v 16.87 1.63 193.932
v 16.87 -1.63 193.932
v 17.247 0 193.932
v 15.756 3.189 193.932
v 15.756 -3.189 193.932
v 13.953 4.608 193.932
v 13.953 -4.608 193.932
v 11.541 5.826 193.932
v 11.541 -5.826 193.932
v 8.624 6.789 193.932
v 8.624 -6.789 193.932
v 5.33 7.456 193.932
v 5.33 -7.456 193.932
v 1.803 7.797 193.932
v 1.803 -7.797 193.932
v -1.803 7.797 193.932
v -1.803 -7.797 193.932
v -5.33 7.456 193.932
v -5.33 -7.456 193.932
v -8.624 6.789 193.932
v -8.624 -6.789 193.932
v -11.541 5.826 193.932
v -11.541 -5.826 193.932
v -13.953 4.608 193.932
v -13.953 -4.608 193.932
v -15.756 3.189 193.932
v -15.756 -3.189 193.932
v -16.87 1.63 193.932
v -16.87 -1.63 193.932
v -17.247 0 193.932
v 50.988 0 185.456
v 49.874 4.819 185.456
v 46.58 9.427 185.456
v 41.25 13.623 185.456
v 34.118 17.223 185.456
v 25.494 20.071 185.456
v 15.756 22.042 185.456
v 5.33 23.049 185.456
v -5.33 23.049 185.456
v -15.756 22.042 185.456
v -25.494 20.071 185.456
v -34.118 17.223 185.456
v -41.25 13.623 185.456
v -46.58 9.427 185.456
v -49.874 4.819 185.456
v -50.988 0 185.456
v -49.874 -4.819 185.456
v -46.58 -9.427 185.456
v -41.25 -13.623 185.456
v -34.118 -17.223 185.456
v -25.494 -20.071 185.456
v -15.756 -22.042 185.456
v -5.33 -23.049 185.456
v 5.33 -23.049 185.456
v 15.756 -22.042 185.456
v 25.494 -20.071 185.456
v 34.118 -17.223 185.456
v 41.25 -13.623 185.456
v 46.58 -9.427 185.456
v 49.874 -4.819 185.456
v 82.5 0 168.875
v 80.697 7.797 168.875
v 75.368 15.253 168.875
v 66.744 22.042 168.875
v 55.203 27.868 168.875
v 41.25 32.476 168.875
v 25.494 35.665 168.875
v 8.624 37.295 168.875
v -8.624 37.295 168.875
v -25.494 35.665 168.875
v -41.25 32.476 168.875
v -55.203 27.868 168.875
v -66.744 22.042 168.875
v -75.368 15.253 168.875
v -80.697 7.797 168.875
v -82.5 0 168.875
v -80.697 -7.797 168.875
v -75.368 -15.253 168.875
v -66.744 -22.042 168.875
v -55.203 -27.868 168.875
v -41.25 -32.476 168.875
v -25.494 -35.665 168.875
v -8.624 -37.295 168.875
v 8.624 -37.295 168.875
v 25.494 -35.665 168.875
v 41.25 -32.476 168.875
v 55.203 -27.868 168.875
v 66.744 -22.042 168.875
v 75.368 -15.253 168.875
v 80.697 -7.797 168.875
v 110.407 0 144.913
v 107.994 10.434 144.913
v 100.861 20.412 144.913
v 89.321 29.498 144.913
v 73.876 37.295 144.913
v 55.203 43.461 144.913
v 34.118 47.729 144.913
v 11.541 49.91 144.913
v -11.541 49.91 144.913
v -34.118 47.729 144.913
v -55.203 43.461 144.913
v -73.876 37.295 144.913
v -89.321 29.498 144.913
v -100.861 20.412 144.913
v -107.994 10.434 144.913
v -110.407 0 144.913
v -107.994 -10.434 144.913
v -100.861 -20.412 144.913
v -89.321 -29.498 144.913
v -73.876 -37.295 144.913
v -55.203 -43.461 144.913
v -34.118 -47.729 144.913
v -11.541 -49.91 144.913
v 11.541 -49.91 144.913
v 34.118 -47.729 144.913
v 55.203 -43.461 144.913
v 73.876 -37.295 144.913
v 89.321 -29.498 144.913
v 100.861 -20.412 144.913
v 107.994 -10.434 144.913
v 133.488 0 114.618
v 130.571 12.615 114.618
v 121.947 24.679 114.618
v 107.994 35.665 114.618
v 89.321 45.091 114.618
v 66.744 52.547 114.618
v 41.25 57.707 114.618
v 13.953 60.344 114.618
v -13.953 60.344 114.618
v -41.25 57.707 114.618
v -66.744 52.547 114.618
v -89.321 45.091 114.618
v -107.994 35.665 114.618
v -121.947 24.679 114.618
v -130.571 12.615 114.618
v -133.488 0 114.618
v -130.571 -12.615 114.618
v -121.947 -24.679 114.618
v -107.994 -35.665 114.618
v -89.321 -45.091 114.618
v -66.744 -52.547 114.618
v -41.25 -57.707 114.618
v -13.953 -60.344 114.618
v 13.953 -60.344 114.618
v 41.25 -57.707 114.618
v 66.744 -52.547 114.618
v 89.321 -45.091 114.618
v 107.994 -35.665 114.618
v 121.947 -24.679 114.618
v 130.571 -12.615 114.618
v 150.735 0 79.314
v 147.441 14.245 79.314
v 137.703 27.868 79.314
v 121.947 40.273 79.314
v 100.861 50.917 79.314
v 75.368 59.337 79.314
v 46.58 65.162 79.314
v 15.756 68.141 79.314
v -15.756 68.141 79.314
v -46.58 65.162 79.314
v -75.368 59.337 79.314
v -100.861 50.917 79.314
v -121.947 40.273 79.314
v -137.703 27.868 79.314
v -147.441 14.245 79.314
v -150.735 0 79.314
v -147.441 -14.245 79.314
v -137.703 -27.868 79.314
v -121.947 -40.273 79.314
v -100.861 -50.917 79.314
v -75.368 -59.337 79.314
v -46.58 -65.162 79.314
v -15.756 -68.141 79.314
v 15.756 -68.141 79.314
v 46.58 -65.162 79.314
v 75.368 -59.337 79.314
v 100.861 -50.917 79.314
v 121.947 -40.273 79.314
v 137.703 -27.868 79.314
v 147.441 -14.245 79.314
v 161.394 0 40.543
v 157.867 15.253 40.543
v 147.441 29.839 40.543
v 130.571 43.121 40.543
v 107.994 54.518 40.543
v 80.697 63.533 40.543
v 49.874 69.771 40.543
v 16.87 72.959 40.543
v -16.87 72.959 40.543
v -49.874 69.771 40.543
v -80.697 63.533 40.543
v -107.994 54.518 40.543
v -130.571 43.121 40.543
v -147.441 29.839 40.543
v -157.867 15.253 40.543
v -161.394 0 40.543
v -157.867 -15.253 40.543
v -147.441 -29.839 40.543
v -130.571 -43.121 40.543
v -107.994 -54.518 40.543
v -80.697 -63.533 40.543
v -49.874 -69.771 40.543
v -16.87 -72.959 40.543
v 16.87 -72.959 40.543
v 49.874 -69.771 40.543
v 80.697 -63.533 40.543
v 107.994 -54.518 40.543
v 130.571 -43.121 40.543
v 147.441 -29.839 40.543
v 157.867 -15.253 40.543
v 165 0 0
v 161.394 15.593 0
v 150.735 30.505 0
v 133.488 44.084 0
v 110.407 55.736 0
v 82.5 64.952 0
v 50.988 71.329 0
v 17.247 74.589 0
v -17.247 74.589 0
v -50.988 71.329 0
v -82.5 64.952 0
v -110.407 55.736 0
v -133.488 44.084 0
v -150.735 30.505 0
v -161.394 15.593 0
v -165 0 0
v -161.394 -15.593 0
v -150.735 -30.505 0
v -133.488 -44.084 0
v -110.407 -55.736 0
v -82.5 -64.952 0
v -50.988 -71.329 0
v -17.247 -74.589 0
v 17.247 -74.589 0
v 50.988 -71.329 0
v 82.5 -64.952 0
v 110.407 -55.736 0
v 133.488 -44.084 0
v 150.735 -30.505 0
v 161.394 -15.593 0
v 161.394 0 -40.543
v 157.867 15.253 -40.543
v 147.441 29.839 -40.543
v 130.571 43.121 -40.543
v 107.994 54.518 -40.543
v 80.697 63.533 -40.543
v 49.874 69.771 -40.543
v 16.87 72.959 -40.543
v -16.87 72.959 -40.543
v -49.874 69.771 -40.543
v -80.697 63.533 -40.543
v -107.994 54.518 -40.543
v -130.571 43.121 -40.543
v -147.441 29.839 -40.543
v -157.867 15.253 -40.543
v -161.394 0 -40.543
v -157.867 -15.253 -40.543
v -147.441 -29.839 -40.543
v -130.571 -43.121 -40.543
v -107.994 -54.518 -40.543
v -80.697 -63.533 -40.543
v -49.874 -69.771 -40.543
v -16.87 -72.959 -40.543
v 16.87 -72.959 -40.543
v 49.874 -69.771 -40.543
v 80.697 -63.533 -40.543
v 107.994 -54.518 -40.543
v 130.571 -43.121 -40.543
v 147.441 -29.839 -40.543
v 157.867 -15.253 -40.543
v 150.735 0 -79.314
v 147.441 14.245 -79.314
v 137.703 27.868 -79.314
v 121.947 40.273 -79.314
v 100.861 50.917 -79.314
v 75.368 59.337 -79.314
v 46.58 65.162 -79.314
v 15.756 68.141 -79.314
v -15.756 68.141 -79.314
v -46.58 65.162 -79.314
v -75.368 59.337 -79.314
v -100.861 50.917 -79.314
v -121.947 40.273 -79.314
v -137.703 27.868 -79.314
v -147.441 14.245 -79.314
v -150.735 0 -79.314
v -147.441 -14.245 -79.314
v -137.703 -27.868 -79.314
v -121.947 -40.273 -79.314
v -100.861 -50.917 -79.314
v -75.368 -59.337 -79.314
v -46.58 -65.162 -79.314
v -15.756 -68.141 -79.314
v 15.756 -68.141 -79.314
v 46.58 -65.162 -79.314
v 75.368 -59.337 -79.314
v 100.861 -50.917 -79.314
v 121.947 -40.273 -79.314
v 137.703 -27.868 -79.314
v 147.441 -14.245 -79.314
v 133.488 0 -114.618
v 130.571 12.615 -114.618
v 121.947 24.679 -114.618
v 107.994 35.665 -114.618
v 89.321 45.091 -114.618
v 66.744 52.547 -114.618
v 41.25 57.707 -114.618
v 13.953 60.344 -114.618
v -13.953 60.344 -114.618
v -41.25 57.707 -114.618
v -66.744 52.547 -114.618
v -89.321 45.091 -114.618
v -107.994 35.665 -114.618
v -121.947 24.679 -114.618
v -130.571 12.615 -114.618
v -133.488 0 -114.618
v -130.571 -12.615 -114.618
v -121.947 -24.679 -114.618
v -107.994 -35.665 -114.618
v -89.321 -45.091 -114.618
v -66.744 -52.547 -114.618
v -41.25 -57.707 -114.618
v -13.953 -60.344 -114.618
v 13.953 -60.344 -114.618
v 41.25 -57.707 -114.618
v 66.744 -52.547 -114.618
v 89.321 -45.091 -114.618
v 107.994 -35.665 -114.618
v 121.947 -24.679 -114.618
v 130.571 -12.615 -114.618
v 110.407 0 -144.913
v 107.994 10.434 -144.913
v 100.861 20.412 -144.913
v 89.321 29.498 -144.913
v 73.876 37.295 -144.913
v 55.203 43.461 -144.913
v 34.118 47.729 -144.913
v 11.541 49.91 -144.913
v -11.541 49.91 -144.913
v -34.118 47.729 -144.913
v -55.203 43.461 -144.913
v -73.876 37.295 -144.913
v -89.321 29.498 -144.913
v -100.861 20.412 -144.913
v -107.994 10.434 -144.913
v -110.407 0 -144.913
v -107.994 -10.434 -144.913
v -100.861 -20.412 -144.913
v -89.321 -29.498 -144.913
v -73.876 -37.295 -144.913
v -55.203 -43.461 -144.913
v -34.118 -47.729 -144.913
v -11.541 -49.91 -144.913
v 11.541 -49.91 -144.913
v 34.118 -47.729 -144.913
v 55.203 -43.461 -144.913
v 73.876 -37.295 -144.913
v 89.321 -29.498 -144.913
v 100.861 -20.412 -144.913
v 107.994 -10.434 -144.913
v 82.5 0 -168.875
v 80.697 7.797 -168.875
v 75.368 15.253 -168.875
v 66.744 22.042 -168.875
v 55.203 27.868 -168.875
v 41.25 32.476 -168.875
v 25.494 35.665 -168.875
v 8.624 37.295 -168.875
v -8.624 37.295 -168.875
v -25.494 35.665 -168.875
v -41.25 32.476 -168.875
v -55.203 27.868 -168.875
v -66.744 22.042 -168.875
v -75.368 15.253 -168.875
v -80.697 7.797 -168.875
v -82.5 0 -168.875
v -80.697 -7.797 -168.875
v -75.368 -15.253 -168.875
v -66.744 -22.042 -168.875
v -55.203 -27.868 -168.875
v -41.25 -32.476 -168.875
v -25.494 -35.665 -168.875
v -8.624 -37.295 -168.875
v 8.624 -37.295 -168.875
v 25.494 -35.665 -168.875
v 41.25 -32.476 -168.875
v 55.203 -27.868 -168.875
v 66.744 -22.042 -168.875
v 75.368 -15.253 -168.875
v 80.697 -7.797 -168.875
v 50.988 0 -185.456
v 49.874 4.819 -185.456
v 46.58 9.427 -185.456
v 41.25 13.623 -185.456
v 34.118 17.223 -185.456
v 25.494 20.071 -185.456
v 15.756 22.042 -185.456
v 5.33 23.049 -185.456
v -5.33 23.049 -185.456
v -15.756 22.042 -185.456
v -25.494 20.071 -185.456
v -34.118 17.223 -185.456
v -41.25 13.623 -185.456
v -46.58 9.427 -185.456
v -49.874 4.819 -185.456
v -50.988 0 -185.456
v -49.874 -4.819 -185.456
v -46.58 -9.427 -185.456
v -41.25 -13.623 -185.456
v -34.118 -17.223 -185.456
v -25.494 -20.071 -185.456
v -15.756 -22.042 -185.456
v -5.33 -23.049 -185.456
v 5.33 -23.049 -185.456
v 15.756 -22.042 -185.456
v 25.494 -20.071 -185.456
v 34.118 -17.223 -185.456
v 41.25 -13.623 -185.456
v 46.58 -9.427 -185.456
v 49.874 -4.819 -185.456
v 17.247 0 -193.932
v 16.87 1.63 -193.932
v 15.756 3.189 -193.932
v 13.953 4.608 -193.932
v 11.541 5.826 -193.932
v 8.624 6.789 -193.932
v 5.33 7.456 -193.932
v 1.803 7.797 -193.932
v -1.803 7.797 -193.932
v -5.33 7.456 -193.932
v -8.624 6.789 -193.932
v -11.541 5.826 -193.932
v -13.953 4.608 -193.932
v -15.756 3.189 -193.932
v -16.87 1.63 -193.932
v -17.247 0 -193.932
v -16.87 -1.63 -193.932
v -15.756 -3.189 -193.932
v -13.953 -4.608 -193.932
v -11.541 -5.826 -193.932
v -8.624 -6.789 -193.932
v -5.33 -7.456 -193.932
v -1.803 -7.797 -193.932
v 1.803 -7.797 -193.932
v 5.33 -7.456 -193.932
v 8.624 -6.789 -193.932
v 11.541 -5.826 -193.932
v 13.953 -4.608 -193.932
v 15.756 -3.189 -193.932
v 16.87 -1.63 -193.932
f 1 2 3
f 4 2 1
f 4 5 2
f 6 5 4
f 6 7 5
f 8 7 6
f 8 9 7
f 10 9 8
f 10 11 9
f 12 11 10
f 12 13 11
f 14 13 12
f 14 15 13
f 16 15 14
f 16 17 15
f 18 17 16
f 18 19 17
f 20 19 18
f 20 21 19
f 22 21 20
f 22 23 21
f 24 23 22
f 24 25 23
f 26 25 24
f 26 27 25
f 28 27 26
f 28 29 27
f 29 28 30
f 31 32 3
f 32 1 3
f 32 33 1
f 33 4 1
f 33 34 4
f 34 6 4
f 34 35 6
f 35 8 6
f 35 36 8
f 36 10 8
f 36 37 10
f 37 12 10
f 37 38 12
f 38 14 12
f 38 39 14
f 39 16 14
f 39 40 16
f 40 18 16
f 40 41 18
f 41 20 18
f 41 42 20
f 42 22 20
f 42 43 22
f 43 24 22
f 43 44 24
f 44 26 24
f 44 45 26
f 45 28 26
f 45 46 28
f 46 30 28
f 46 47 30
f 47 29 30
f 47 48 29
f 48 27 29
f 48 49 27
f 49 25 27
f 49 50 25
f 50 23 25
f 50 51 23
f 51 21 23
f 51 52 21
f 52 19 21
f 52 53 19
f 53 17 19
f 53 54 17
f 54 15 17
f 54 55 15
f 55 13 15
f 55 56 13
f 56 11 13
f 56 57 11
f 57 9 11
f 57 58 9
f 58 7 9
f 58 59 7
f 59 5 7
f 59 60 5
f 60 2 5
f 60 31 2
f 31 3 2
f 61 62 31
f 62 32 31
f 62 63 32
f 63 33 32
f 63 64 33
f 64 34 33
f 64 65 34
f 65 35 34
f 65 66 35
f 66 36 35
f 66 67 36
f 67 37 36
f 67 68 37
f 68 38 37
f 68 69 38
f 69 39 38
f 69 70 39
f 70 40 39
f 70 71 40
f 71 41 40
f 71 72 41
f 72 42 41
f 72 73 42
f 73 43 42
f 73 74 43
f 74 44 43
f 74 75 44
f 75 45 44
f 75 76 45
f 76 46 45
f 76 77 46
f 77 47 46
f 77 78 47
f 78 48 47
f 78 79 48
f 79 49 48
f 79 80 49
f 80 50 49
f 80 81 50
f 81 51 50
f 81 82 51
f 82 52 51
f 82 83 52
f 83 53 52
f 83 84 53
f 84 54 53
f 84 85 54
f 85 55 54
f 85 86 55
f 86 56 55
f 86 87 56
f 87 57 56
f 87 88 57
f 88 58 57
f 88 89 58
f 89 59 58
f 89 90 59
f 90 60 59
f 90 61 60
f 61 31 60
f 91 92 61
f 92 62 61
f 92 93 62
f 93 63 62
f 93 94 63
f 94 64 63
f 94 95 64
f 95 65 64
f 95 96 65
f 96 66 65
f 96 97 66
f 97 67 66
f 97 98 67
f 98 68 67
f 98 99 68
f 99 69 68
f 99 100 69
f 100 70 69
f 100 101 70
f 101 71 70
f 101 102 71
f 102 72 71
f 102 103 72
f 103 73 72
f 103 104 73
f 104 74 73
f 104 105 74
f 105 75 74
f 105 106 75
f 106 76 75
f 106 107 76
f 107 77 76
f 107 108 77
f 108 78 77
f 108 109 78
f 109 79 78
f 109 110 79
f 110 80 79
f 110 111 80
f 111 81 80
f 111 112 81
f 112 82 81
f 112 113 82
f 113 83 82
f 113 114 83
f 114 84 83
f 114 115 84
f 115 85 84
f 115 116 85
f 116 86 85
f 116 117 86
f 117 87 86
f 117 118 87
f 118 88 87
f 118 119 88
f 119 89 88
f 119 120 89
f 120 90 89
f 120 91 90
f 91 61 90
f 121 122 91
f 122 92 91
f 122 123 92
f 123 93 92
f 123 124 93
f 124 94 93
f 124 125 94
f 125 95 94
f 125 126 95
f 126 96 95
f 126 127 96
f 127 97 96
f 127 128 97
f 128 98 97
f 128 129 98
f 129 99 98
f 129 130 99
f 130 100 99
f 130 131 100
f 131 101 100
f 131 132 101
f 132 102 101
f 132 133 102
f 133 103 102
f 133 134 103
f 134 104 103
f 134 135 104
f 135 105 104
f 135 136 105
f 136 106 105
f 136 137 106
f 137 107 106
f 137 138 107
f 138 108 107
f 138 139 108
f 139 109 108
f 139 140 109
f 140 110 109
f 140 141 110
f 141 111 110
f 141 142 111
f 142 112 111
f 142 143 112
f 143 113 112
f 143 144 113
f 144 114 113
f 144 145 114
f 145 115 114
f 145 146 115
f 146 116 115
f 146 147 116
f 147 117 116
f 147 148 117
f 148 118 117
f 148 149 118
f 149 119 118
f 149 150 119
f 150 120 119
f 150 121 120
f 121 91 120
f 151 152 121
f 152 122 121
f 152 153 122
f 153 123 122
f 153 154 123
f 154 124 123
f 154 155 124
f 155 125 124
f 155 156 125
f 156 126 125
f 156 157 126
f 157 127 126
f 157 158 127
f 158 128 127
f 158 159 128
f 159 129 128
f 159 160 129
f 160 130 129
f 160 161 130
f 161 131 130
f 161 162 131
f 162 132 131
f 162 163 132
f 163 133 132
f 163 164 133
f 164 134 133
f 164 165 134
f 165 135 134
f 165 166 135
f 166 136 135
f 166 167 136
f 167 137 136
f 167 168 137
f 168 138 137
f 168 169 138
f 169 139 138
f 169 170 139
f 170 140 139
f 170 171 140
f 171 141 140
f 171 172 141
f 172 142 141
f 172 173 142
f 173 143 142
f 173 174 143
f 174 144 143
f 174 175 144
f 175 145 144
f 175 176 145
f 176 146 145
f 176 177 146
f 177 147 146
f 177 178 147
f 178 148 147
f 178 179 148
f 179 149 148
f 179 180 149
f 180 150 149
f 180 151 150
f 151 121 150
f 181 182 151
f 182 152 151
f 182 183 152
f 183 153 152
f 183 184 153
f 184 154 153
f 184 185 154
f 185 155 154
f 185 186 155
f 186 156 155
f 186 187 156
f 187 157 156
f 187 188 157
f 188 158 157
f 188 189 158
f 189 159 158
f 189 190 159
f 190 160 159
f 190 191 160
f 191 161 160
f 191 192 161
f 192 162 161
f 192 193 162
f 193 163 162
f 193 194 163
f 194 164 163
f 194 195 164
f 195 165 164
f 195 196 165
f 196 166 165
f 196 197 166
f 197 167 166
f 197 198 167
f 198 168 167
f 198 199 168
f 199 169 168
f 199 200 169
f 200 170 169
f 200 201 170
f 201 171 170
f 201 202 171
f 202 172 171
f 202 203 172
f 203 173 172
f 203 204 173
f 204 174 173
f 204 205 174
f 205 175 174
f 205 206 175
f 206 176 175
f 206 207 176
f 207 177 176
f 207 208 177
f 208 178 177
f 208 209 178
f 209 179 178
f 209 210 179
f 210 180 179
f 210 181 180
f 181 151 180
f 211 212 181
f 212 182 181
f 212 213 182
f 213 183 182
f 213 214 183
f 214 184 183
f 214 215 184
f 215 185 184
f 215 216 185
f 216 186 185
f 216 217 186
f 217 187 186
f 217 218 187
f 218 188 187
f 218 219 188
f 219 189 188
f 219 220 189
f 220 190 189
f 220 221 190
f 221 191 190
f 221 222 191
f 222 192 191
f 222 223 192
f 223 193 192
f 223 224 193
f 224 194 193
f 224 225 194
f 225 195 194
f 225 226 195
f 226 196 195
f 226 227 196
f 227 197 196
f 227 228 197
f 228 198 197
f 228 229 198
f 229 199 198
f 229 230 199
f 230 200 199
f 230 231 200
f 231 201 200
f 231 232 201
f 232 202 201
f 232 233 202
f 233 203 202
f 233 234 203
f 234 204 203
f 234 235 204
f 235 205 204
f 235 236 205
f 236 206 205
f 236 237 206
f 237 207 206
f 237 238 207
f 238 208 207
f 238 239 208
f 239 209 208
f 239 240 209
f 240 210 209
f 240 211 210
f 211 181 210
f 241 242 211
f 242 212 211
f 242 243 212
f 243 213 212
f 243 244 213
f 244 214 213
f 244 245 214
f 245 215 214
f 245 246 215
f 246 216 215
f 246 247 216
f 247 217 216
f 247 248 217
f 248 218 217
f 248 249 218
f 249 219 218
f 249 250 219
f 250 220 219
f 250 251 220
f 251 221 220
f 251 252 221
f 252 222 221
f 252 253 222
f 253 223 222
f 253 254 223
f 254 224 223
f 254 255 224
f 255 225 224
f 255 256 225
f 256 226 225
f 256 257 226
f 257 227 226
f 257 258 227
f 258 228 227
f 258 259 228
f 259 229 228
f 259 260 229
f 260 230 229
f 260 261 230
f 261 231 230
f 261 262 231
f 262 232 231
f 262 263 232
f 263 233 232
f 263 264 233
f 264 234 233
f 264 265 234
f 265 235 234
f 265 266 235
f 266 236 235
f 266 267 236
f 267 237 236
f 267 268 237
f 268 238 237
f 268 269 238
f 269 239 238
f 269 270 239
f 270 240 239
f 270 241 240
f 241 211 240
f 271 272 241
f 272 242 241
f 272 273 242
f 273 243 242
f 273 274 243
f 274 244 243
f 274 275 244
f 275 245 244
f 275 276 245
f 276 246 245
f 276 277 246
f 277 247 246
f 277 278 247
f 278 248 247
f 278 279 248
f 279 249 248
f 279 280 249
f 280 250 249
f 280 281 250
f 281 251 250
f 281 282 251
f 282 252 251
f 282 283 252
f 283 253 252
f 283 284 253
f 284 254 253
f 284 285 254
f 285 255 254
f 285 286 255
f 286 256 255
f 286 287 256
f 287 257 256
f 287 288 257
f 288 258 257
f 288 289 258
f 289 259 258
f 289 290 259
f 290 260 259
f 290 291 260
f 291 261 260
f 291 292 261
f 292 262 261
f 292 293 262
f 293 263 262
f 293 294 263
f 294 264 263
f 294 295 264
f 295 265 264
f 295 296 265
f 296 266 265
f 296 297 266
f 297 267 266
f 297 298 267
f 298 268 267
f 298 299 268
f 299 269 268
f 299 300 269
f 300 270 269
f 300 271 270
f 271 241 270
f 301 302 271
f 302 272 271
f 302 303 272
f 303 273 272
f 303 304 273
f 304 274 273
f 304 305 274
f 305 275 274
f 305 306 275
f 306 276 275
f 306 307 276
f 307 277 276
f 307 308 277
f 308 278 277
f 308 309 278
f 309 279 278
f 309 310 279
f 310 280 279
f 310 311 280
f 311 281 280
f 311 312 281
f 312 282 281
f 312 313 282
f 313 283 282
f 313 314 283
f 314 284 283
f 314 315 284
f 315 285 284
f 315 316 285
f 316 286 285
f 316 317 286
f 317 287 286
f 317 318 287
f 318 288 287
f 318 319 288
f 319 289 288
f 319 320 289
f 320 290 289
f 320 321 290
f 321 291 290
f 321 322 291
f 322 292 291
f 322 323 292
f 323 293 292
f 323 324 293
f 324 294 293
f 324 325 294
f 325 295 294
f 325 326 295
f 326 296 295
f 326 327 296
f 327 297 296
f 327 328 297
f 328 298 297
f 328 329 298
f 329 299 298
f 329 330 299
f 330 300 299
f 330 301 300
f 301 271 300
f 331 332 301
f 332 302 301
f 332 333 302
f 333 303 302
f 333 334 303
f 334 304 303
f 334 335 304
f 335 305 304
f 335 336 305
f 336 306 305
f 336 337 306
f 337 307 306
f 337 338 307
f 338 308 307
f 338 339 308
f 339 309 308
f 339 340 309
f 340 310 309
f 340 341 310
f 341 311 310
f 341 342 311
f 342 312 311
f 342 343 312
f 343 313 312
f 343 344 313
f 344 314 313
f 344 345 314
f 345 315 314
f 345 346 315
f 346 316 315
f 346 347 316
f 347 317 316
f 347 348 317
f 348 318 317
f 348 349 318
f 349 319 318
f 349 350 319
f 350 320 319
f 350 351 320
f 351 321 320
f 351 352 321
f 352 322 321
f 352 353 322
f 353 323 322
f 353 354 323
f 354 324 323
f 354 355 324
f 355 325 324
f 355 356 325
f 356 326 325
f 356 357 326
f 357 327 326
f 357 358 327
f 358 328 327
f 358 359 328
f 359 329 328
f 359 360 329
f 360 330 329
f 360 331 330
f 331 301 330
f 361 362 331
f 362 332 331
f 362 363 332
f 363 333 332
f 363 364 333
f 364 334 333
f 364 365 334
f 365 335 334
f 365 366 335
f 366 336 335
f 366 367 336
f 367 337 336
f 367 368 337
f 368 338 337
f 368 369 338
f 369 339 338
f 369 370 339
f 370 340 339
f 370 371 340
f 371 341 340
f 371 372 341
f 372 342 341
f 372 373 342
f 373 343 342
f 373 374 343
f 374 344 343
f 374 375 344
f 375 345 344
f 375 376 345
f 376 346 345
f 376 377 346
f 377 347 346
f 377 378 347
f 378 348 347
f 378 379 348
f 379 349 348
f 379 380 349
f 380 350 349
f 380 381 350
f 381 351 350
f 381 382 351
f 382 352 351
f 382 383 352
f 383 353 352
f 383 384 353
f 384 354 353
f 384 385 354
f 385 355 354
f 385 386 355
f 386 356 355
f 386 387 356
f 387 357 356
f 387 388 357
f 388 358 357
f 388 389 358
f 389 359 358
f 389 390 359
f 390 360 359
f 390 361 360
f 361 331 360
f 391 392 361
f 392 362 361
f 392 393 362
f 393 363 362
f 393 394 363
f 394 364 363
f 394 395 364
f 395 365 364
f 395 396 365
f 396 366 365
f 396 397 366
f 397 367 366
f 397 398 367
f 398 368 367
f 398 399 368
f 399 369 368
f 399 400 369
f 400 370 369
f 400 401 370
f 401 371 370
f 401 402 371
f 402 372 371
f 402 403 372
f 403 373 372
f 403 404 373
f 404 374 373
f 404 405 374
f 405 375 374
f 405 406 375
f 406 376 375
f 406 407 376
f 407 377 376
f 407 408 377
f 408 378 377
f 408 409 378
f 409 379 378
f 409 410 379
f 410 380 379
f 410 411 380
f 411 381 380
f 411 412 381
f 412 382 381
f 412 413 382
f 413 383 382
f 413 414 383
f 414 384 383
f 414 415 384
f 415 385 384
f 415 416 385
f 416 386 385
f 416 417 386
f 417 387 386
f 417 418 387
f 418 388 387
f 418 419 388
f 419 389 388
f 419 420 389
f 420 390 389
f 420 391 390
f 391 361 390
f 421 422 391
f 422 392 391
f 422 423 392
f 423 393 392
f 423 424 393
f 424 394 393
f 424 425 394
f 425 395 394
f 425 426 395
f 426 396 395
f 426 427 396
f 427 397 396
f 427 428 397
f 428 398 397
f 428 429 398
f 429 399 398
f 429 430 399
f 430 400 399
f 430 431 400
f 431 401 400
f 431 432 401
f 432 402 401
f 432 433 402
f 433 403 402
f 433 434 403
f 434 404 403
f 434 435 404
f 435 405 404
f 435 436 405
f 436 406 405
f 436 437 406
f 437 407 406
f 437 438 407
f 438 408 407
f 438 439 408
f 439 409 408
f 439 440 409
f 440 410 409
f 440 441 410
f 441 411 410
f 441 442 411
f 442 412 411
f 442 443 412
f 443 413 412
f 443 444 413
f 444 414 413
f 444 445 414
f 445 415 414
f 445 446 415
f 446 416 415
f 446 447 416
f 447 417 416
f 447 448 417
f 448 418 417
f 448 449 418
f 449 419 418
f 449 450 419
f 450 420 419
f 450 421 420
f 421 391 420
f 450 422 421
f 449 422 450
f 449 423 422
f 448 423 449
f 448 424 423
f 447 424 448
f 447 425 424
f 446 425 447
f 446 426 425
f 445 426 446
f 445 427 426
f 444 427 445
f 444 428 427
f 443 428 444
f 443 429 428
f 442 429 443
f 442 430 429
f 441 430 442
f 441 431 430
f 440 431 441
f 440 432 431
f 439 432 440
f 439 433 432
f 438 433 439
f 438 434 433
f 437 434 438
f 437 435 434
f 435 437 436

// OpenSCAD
// Generated by SolidPython 1.0.1 on 2020-07-29 00:46:49


scale(v = [11, 5, 13]) {
	sphere(r = 15);
}
/***********************************************
*********      SolidPython code:      **********
************************************************
 
# import packages: SolidPython
from solid import *
from solid.utils import *
from itertools import chain, combinations, permutations


class Resize:

    def __init__(self, scad_file):
        self.scad_file = scad_file
        #self.scad_file = import_scad(scad_file)
        # cone/cylinder param:
        self.r1 = 0
        self.r2 = 0
        self.h = 0
        # rectangular prism param:
        self.w = 0
        self.l = 0
        # ellipse param:
        self.r = 0

    # import OpenScad code (file name corresponds to shape)


    # classify shape + parameters
    def assign(self, param1, param2, param3):
        if self.scad_file == 'cone.scad':
            self.r1 = param1
            self.r2 = param2
            self.h = param3
        elif self.scad_file == 'cylinder.scad':
            self.r1 = param1
            self.r2 = param2
            self.h = param3
        elif self.scad_file == 'rectangularPrism.scad':
            self.h = param1
            self.l = param2
            self.w = param3
        else:
            self.r = param1
            self.h = param2

    # resize parameters
    def iterate(self):
        x = range(3, 20, 2)
        i = 1
        if self.scad_file == 'cone.scad':
            tempList = list(permutations(x, 2))
            for temp in tempList:
                param1 = temp[0]
                param2 = temp[1]
                filepath = 'produced_scad_files/' + 'cone' + str(param1) + '_' + str(param2) + '_' + '.scad'
                scad_render_to_file(cylinder(h=param1, r1=param2, r2=0), filepath)

        elif self.scad_file == 'cylinder.scad':
            tempList = list(permutations(x, 3))
            for temp in tempList:
                param1 = temp[0]
                param2 = temp[1]
                filepath = 'produced_scad_files/' + 'cylinder' + str(param1) + '_' + str(param2) + '_' + '.scad'
                scad_render_to_file(cylinder(h=param1, r1=param2, r2=param2), filepath)

        elif self.scad_file == 'rectangularPrism.scad':
            tempList = list(permutations(x, 3))
            for temp in tempList:
                param1 = temp[0]
                param2 = temp[1]
                param3 = temp[2]
                filepath = 'produced_scad_files/' + 'rectangularPrism' + str(param1) + '_' + str(param2) + '_' + str(
                    param3) + '.scad'
                scad_render_to_file(cube(size=(param1, param2, param3)), filepath)

        elif self.scad_file == 'ellipse.scad':
            tempList = list(permutations(x, 4))
            for temp in tempList:
                param1 = temp[0]
                param2 = temp[1]
                param3 = temp[2]
                param4 = temp[3]
                filepath = 'produced_scad_files/' + 'ellipse' + str(param1) + '_' + str(param2) + '_' + str(param3) + '_' + str(param4) + '.scad'
                scad_render_to_file(scale([param1, param2, param3])(sphere(r=param4)), filepath)

    def render_to_scadfile(self):
        scad_render_to_file(scad, 'example.scad') 
 
************************************************/
